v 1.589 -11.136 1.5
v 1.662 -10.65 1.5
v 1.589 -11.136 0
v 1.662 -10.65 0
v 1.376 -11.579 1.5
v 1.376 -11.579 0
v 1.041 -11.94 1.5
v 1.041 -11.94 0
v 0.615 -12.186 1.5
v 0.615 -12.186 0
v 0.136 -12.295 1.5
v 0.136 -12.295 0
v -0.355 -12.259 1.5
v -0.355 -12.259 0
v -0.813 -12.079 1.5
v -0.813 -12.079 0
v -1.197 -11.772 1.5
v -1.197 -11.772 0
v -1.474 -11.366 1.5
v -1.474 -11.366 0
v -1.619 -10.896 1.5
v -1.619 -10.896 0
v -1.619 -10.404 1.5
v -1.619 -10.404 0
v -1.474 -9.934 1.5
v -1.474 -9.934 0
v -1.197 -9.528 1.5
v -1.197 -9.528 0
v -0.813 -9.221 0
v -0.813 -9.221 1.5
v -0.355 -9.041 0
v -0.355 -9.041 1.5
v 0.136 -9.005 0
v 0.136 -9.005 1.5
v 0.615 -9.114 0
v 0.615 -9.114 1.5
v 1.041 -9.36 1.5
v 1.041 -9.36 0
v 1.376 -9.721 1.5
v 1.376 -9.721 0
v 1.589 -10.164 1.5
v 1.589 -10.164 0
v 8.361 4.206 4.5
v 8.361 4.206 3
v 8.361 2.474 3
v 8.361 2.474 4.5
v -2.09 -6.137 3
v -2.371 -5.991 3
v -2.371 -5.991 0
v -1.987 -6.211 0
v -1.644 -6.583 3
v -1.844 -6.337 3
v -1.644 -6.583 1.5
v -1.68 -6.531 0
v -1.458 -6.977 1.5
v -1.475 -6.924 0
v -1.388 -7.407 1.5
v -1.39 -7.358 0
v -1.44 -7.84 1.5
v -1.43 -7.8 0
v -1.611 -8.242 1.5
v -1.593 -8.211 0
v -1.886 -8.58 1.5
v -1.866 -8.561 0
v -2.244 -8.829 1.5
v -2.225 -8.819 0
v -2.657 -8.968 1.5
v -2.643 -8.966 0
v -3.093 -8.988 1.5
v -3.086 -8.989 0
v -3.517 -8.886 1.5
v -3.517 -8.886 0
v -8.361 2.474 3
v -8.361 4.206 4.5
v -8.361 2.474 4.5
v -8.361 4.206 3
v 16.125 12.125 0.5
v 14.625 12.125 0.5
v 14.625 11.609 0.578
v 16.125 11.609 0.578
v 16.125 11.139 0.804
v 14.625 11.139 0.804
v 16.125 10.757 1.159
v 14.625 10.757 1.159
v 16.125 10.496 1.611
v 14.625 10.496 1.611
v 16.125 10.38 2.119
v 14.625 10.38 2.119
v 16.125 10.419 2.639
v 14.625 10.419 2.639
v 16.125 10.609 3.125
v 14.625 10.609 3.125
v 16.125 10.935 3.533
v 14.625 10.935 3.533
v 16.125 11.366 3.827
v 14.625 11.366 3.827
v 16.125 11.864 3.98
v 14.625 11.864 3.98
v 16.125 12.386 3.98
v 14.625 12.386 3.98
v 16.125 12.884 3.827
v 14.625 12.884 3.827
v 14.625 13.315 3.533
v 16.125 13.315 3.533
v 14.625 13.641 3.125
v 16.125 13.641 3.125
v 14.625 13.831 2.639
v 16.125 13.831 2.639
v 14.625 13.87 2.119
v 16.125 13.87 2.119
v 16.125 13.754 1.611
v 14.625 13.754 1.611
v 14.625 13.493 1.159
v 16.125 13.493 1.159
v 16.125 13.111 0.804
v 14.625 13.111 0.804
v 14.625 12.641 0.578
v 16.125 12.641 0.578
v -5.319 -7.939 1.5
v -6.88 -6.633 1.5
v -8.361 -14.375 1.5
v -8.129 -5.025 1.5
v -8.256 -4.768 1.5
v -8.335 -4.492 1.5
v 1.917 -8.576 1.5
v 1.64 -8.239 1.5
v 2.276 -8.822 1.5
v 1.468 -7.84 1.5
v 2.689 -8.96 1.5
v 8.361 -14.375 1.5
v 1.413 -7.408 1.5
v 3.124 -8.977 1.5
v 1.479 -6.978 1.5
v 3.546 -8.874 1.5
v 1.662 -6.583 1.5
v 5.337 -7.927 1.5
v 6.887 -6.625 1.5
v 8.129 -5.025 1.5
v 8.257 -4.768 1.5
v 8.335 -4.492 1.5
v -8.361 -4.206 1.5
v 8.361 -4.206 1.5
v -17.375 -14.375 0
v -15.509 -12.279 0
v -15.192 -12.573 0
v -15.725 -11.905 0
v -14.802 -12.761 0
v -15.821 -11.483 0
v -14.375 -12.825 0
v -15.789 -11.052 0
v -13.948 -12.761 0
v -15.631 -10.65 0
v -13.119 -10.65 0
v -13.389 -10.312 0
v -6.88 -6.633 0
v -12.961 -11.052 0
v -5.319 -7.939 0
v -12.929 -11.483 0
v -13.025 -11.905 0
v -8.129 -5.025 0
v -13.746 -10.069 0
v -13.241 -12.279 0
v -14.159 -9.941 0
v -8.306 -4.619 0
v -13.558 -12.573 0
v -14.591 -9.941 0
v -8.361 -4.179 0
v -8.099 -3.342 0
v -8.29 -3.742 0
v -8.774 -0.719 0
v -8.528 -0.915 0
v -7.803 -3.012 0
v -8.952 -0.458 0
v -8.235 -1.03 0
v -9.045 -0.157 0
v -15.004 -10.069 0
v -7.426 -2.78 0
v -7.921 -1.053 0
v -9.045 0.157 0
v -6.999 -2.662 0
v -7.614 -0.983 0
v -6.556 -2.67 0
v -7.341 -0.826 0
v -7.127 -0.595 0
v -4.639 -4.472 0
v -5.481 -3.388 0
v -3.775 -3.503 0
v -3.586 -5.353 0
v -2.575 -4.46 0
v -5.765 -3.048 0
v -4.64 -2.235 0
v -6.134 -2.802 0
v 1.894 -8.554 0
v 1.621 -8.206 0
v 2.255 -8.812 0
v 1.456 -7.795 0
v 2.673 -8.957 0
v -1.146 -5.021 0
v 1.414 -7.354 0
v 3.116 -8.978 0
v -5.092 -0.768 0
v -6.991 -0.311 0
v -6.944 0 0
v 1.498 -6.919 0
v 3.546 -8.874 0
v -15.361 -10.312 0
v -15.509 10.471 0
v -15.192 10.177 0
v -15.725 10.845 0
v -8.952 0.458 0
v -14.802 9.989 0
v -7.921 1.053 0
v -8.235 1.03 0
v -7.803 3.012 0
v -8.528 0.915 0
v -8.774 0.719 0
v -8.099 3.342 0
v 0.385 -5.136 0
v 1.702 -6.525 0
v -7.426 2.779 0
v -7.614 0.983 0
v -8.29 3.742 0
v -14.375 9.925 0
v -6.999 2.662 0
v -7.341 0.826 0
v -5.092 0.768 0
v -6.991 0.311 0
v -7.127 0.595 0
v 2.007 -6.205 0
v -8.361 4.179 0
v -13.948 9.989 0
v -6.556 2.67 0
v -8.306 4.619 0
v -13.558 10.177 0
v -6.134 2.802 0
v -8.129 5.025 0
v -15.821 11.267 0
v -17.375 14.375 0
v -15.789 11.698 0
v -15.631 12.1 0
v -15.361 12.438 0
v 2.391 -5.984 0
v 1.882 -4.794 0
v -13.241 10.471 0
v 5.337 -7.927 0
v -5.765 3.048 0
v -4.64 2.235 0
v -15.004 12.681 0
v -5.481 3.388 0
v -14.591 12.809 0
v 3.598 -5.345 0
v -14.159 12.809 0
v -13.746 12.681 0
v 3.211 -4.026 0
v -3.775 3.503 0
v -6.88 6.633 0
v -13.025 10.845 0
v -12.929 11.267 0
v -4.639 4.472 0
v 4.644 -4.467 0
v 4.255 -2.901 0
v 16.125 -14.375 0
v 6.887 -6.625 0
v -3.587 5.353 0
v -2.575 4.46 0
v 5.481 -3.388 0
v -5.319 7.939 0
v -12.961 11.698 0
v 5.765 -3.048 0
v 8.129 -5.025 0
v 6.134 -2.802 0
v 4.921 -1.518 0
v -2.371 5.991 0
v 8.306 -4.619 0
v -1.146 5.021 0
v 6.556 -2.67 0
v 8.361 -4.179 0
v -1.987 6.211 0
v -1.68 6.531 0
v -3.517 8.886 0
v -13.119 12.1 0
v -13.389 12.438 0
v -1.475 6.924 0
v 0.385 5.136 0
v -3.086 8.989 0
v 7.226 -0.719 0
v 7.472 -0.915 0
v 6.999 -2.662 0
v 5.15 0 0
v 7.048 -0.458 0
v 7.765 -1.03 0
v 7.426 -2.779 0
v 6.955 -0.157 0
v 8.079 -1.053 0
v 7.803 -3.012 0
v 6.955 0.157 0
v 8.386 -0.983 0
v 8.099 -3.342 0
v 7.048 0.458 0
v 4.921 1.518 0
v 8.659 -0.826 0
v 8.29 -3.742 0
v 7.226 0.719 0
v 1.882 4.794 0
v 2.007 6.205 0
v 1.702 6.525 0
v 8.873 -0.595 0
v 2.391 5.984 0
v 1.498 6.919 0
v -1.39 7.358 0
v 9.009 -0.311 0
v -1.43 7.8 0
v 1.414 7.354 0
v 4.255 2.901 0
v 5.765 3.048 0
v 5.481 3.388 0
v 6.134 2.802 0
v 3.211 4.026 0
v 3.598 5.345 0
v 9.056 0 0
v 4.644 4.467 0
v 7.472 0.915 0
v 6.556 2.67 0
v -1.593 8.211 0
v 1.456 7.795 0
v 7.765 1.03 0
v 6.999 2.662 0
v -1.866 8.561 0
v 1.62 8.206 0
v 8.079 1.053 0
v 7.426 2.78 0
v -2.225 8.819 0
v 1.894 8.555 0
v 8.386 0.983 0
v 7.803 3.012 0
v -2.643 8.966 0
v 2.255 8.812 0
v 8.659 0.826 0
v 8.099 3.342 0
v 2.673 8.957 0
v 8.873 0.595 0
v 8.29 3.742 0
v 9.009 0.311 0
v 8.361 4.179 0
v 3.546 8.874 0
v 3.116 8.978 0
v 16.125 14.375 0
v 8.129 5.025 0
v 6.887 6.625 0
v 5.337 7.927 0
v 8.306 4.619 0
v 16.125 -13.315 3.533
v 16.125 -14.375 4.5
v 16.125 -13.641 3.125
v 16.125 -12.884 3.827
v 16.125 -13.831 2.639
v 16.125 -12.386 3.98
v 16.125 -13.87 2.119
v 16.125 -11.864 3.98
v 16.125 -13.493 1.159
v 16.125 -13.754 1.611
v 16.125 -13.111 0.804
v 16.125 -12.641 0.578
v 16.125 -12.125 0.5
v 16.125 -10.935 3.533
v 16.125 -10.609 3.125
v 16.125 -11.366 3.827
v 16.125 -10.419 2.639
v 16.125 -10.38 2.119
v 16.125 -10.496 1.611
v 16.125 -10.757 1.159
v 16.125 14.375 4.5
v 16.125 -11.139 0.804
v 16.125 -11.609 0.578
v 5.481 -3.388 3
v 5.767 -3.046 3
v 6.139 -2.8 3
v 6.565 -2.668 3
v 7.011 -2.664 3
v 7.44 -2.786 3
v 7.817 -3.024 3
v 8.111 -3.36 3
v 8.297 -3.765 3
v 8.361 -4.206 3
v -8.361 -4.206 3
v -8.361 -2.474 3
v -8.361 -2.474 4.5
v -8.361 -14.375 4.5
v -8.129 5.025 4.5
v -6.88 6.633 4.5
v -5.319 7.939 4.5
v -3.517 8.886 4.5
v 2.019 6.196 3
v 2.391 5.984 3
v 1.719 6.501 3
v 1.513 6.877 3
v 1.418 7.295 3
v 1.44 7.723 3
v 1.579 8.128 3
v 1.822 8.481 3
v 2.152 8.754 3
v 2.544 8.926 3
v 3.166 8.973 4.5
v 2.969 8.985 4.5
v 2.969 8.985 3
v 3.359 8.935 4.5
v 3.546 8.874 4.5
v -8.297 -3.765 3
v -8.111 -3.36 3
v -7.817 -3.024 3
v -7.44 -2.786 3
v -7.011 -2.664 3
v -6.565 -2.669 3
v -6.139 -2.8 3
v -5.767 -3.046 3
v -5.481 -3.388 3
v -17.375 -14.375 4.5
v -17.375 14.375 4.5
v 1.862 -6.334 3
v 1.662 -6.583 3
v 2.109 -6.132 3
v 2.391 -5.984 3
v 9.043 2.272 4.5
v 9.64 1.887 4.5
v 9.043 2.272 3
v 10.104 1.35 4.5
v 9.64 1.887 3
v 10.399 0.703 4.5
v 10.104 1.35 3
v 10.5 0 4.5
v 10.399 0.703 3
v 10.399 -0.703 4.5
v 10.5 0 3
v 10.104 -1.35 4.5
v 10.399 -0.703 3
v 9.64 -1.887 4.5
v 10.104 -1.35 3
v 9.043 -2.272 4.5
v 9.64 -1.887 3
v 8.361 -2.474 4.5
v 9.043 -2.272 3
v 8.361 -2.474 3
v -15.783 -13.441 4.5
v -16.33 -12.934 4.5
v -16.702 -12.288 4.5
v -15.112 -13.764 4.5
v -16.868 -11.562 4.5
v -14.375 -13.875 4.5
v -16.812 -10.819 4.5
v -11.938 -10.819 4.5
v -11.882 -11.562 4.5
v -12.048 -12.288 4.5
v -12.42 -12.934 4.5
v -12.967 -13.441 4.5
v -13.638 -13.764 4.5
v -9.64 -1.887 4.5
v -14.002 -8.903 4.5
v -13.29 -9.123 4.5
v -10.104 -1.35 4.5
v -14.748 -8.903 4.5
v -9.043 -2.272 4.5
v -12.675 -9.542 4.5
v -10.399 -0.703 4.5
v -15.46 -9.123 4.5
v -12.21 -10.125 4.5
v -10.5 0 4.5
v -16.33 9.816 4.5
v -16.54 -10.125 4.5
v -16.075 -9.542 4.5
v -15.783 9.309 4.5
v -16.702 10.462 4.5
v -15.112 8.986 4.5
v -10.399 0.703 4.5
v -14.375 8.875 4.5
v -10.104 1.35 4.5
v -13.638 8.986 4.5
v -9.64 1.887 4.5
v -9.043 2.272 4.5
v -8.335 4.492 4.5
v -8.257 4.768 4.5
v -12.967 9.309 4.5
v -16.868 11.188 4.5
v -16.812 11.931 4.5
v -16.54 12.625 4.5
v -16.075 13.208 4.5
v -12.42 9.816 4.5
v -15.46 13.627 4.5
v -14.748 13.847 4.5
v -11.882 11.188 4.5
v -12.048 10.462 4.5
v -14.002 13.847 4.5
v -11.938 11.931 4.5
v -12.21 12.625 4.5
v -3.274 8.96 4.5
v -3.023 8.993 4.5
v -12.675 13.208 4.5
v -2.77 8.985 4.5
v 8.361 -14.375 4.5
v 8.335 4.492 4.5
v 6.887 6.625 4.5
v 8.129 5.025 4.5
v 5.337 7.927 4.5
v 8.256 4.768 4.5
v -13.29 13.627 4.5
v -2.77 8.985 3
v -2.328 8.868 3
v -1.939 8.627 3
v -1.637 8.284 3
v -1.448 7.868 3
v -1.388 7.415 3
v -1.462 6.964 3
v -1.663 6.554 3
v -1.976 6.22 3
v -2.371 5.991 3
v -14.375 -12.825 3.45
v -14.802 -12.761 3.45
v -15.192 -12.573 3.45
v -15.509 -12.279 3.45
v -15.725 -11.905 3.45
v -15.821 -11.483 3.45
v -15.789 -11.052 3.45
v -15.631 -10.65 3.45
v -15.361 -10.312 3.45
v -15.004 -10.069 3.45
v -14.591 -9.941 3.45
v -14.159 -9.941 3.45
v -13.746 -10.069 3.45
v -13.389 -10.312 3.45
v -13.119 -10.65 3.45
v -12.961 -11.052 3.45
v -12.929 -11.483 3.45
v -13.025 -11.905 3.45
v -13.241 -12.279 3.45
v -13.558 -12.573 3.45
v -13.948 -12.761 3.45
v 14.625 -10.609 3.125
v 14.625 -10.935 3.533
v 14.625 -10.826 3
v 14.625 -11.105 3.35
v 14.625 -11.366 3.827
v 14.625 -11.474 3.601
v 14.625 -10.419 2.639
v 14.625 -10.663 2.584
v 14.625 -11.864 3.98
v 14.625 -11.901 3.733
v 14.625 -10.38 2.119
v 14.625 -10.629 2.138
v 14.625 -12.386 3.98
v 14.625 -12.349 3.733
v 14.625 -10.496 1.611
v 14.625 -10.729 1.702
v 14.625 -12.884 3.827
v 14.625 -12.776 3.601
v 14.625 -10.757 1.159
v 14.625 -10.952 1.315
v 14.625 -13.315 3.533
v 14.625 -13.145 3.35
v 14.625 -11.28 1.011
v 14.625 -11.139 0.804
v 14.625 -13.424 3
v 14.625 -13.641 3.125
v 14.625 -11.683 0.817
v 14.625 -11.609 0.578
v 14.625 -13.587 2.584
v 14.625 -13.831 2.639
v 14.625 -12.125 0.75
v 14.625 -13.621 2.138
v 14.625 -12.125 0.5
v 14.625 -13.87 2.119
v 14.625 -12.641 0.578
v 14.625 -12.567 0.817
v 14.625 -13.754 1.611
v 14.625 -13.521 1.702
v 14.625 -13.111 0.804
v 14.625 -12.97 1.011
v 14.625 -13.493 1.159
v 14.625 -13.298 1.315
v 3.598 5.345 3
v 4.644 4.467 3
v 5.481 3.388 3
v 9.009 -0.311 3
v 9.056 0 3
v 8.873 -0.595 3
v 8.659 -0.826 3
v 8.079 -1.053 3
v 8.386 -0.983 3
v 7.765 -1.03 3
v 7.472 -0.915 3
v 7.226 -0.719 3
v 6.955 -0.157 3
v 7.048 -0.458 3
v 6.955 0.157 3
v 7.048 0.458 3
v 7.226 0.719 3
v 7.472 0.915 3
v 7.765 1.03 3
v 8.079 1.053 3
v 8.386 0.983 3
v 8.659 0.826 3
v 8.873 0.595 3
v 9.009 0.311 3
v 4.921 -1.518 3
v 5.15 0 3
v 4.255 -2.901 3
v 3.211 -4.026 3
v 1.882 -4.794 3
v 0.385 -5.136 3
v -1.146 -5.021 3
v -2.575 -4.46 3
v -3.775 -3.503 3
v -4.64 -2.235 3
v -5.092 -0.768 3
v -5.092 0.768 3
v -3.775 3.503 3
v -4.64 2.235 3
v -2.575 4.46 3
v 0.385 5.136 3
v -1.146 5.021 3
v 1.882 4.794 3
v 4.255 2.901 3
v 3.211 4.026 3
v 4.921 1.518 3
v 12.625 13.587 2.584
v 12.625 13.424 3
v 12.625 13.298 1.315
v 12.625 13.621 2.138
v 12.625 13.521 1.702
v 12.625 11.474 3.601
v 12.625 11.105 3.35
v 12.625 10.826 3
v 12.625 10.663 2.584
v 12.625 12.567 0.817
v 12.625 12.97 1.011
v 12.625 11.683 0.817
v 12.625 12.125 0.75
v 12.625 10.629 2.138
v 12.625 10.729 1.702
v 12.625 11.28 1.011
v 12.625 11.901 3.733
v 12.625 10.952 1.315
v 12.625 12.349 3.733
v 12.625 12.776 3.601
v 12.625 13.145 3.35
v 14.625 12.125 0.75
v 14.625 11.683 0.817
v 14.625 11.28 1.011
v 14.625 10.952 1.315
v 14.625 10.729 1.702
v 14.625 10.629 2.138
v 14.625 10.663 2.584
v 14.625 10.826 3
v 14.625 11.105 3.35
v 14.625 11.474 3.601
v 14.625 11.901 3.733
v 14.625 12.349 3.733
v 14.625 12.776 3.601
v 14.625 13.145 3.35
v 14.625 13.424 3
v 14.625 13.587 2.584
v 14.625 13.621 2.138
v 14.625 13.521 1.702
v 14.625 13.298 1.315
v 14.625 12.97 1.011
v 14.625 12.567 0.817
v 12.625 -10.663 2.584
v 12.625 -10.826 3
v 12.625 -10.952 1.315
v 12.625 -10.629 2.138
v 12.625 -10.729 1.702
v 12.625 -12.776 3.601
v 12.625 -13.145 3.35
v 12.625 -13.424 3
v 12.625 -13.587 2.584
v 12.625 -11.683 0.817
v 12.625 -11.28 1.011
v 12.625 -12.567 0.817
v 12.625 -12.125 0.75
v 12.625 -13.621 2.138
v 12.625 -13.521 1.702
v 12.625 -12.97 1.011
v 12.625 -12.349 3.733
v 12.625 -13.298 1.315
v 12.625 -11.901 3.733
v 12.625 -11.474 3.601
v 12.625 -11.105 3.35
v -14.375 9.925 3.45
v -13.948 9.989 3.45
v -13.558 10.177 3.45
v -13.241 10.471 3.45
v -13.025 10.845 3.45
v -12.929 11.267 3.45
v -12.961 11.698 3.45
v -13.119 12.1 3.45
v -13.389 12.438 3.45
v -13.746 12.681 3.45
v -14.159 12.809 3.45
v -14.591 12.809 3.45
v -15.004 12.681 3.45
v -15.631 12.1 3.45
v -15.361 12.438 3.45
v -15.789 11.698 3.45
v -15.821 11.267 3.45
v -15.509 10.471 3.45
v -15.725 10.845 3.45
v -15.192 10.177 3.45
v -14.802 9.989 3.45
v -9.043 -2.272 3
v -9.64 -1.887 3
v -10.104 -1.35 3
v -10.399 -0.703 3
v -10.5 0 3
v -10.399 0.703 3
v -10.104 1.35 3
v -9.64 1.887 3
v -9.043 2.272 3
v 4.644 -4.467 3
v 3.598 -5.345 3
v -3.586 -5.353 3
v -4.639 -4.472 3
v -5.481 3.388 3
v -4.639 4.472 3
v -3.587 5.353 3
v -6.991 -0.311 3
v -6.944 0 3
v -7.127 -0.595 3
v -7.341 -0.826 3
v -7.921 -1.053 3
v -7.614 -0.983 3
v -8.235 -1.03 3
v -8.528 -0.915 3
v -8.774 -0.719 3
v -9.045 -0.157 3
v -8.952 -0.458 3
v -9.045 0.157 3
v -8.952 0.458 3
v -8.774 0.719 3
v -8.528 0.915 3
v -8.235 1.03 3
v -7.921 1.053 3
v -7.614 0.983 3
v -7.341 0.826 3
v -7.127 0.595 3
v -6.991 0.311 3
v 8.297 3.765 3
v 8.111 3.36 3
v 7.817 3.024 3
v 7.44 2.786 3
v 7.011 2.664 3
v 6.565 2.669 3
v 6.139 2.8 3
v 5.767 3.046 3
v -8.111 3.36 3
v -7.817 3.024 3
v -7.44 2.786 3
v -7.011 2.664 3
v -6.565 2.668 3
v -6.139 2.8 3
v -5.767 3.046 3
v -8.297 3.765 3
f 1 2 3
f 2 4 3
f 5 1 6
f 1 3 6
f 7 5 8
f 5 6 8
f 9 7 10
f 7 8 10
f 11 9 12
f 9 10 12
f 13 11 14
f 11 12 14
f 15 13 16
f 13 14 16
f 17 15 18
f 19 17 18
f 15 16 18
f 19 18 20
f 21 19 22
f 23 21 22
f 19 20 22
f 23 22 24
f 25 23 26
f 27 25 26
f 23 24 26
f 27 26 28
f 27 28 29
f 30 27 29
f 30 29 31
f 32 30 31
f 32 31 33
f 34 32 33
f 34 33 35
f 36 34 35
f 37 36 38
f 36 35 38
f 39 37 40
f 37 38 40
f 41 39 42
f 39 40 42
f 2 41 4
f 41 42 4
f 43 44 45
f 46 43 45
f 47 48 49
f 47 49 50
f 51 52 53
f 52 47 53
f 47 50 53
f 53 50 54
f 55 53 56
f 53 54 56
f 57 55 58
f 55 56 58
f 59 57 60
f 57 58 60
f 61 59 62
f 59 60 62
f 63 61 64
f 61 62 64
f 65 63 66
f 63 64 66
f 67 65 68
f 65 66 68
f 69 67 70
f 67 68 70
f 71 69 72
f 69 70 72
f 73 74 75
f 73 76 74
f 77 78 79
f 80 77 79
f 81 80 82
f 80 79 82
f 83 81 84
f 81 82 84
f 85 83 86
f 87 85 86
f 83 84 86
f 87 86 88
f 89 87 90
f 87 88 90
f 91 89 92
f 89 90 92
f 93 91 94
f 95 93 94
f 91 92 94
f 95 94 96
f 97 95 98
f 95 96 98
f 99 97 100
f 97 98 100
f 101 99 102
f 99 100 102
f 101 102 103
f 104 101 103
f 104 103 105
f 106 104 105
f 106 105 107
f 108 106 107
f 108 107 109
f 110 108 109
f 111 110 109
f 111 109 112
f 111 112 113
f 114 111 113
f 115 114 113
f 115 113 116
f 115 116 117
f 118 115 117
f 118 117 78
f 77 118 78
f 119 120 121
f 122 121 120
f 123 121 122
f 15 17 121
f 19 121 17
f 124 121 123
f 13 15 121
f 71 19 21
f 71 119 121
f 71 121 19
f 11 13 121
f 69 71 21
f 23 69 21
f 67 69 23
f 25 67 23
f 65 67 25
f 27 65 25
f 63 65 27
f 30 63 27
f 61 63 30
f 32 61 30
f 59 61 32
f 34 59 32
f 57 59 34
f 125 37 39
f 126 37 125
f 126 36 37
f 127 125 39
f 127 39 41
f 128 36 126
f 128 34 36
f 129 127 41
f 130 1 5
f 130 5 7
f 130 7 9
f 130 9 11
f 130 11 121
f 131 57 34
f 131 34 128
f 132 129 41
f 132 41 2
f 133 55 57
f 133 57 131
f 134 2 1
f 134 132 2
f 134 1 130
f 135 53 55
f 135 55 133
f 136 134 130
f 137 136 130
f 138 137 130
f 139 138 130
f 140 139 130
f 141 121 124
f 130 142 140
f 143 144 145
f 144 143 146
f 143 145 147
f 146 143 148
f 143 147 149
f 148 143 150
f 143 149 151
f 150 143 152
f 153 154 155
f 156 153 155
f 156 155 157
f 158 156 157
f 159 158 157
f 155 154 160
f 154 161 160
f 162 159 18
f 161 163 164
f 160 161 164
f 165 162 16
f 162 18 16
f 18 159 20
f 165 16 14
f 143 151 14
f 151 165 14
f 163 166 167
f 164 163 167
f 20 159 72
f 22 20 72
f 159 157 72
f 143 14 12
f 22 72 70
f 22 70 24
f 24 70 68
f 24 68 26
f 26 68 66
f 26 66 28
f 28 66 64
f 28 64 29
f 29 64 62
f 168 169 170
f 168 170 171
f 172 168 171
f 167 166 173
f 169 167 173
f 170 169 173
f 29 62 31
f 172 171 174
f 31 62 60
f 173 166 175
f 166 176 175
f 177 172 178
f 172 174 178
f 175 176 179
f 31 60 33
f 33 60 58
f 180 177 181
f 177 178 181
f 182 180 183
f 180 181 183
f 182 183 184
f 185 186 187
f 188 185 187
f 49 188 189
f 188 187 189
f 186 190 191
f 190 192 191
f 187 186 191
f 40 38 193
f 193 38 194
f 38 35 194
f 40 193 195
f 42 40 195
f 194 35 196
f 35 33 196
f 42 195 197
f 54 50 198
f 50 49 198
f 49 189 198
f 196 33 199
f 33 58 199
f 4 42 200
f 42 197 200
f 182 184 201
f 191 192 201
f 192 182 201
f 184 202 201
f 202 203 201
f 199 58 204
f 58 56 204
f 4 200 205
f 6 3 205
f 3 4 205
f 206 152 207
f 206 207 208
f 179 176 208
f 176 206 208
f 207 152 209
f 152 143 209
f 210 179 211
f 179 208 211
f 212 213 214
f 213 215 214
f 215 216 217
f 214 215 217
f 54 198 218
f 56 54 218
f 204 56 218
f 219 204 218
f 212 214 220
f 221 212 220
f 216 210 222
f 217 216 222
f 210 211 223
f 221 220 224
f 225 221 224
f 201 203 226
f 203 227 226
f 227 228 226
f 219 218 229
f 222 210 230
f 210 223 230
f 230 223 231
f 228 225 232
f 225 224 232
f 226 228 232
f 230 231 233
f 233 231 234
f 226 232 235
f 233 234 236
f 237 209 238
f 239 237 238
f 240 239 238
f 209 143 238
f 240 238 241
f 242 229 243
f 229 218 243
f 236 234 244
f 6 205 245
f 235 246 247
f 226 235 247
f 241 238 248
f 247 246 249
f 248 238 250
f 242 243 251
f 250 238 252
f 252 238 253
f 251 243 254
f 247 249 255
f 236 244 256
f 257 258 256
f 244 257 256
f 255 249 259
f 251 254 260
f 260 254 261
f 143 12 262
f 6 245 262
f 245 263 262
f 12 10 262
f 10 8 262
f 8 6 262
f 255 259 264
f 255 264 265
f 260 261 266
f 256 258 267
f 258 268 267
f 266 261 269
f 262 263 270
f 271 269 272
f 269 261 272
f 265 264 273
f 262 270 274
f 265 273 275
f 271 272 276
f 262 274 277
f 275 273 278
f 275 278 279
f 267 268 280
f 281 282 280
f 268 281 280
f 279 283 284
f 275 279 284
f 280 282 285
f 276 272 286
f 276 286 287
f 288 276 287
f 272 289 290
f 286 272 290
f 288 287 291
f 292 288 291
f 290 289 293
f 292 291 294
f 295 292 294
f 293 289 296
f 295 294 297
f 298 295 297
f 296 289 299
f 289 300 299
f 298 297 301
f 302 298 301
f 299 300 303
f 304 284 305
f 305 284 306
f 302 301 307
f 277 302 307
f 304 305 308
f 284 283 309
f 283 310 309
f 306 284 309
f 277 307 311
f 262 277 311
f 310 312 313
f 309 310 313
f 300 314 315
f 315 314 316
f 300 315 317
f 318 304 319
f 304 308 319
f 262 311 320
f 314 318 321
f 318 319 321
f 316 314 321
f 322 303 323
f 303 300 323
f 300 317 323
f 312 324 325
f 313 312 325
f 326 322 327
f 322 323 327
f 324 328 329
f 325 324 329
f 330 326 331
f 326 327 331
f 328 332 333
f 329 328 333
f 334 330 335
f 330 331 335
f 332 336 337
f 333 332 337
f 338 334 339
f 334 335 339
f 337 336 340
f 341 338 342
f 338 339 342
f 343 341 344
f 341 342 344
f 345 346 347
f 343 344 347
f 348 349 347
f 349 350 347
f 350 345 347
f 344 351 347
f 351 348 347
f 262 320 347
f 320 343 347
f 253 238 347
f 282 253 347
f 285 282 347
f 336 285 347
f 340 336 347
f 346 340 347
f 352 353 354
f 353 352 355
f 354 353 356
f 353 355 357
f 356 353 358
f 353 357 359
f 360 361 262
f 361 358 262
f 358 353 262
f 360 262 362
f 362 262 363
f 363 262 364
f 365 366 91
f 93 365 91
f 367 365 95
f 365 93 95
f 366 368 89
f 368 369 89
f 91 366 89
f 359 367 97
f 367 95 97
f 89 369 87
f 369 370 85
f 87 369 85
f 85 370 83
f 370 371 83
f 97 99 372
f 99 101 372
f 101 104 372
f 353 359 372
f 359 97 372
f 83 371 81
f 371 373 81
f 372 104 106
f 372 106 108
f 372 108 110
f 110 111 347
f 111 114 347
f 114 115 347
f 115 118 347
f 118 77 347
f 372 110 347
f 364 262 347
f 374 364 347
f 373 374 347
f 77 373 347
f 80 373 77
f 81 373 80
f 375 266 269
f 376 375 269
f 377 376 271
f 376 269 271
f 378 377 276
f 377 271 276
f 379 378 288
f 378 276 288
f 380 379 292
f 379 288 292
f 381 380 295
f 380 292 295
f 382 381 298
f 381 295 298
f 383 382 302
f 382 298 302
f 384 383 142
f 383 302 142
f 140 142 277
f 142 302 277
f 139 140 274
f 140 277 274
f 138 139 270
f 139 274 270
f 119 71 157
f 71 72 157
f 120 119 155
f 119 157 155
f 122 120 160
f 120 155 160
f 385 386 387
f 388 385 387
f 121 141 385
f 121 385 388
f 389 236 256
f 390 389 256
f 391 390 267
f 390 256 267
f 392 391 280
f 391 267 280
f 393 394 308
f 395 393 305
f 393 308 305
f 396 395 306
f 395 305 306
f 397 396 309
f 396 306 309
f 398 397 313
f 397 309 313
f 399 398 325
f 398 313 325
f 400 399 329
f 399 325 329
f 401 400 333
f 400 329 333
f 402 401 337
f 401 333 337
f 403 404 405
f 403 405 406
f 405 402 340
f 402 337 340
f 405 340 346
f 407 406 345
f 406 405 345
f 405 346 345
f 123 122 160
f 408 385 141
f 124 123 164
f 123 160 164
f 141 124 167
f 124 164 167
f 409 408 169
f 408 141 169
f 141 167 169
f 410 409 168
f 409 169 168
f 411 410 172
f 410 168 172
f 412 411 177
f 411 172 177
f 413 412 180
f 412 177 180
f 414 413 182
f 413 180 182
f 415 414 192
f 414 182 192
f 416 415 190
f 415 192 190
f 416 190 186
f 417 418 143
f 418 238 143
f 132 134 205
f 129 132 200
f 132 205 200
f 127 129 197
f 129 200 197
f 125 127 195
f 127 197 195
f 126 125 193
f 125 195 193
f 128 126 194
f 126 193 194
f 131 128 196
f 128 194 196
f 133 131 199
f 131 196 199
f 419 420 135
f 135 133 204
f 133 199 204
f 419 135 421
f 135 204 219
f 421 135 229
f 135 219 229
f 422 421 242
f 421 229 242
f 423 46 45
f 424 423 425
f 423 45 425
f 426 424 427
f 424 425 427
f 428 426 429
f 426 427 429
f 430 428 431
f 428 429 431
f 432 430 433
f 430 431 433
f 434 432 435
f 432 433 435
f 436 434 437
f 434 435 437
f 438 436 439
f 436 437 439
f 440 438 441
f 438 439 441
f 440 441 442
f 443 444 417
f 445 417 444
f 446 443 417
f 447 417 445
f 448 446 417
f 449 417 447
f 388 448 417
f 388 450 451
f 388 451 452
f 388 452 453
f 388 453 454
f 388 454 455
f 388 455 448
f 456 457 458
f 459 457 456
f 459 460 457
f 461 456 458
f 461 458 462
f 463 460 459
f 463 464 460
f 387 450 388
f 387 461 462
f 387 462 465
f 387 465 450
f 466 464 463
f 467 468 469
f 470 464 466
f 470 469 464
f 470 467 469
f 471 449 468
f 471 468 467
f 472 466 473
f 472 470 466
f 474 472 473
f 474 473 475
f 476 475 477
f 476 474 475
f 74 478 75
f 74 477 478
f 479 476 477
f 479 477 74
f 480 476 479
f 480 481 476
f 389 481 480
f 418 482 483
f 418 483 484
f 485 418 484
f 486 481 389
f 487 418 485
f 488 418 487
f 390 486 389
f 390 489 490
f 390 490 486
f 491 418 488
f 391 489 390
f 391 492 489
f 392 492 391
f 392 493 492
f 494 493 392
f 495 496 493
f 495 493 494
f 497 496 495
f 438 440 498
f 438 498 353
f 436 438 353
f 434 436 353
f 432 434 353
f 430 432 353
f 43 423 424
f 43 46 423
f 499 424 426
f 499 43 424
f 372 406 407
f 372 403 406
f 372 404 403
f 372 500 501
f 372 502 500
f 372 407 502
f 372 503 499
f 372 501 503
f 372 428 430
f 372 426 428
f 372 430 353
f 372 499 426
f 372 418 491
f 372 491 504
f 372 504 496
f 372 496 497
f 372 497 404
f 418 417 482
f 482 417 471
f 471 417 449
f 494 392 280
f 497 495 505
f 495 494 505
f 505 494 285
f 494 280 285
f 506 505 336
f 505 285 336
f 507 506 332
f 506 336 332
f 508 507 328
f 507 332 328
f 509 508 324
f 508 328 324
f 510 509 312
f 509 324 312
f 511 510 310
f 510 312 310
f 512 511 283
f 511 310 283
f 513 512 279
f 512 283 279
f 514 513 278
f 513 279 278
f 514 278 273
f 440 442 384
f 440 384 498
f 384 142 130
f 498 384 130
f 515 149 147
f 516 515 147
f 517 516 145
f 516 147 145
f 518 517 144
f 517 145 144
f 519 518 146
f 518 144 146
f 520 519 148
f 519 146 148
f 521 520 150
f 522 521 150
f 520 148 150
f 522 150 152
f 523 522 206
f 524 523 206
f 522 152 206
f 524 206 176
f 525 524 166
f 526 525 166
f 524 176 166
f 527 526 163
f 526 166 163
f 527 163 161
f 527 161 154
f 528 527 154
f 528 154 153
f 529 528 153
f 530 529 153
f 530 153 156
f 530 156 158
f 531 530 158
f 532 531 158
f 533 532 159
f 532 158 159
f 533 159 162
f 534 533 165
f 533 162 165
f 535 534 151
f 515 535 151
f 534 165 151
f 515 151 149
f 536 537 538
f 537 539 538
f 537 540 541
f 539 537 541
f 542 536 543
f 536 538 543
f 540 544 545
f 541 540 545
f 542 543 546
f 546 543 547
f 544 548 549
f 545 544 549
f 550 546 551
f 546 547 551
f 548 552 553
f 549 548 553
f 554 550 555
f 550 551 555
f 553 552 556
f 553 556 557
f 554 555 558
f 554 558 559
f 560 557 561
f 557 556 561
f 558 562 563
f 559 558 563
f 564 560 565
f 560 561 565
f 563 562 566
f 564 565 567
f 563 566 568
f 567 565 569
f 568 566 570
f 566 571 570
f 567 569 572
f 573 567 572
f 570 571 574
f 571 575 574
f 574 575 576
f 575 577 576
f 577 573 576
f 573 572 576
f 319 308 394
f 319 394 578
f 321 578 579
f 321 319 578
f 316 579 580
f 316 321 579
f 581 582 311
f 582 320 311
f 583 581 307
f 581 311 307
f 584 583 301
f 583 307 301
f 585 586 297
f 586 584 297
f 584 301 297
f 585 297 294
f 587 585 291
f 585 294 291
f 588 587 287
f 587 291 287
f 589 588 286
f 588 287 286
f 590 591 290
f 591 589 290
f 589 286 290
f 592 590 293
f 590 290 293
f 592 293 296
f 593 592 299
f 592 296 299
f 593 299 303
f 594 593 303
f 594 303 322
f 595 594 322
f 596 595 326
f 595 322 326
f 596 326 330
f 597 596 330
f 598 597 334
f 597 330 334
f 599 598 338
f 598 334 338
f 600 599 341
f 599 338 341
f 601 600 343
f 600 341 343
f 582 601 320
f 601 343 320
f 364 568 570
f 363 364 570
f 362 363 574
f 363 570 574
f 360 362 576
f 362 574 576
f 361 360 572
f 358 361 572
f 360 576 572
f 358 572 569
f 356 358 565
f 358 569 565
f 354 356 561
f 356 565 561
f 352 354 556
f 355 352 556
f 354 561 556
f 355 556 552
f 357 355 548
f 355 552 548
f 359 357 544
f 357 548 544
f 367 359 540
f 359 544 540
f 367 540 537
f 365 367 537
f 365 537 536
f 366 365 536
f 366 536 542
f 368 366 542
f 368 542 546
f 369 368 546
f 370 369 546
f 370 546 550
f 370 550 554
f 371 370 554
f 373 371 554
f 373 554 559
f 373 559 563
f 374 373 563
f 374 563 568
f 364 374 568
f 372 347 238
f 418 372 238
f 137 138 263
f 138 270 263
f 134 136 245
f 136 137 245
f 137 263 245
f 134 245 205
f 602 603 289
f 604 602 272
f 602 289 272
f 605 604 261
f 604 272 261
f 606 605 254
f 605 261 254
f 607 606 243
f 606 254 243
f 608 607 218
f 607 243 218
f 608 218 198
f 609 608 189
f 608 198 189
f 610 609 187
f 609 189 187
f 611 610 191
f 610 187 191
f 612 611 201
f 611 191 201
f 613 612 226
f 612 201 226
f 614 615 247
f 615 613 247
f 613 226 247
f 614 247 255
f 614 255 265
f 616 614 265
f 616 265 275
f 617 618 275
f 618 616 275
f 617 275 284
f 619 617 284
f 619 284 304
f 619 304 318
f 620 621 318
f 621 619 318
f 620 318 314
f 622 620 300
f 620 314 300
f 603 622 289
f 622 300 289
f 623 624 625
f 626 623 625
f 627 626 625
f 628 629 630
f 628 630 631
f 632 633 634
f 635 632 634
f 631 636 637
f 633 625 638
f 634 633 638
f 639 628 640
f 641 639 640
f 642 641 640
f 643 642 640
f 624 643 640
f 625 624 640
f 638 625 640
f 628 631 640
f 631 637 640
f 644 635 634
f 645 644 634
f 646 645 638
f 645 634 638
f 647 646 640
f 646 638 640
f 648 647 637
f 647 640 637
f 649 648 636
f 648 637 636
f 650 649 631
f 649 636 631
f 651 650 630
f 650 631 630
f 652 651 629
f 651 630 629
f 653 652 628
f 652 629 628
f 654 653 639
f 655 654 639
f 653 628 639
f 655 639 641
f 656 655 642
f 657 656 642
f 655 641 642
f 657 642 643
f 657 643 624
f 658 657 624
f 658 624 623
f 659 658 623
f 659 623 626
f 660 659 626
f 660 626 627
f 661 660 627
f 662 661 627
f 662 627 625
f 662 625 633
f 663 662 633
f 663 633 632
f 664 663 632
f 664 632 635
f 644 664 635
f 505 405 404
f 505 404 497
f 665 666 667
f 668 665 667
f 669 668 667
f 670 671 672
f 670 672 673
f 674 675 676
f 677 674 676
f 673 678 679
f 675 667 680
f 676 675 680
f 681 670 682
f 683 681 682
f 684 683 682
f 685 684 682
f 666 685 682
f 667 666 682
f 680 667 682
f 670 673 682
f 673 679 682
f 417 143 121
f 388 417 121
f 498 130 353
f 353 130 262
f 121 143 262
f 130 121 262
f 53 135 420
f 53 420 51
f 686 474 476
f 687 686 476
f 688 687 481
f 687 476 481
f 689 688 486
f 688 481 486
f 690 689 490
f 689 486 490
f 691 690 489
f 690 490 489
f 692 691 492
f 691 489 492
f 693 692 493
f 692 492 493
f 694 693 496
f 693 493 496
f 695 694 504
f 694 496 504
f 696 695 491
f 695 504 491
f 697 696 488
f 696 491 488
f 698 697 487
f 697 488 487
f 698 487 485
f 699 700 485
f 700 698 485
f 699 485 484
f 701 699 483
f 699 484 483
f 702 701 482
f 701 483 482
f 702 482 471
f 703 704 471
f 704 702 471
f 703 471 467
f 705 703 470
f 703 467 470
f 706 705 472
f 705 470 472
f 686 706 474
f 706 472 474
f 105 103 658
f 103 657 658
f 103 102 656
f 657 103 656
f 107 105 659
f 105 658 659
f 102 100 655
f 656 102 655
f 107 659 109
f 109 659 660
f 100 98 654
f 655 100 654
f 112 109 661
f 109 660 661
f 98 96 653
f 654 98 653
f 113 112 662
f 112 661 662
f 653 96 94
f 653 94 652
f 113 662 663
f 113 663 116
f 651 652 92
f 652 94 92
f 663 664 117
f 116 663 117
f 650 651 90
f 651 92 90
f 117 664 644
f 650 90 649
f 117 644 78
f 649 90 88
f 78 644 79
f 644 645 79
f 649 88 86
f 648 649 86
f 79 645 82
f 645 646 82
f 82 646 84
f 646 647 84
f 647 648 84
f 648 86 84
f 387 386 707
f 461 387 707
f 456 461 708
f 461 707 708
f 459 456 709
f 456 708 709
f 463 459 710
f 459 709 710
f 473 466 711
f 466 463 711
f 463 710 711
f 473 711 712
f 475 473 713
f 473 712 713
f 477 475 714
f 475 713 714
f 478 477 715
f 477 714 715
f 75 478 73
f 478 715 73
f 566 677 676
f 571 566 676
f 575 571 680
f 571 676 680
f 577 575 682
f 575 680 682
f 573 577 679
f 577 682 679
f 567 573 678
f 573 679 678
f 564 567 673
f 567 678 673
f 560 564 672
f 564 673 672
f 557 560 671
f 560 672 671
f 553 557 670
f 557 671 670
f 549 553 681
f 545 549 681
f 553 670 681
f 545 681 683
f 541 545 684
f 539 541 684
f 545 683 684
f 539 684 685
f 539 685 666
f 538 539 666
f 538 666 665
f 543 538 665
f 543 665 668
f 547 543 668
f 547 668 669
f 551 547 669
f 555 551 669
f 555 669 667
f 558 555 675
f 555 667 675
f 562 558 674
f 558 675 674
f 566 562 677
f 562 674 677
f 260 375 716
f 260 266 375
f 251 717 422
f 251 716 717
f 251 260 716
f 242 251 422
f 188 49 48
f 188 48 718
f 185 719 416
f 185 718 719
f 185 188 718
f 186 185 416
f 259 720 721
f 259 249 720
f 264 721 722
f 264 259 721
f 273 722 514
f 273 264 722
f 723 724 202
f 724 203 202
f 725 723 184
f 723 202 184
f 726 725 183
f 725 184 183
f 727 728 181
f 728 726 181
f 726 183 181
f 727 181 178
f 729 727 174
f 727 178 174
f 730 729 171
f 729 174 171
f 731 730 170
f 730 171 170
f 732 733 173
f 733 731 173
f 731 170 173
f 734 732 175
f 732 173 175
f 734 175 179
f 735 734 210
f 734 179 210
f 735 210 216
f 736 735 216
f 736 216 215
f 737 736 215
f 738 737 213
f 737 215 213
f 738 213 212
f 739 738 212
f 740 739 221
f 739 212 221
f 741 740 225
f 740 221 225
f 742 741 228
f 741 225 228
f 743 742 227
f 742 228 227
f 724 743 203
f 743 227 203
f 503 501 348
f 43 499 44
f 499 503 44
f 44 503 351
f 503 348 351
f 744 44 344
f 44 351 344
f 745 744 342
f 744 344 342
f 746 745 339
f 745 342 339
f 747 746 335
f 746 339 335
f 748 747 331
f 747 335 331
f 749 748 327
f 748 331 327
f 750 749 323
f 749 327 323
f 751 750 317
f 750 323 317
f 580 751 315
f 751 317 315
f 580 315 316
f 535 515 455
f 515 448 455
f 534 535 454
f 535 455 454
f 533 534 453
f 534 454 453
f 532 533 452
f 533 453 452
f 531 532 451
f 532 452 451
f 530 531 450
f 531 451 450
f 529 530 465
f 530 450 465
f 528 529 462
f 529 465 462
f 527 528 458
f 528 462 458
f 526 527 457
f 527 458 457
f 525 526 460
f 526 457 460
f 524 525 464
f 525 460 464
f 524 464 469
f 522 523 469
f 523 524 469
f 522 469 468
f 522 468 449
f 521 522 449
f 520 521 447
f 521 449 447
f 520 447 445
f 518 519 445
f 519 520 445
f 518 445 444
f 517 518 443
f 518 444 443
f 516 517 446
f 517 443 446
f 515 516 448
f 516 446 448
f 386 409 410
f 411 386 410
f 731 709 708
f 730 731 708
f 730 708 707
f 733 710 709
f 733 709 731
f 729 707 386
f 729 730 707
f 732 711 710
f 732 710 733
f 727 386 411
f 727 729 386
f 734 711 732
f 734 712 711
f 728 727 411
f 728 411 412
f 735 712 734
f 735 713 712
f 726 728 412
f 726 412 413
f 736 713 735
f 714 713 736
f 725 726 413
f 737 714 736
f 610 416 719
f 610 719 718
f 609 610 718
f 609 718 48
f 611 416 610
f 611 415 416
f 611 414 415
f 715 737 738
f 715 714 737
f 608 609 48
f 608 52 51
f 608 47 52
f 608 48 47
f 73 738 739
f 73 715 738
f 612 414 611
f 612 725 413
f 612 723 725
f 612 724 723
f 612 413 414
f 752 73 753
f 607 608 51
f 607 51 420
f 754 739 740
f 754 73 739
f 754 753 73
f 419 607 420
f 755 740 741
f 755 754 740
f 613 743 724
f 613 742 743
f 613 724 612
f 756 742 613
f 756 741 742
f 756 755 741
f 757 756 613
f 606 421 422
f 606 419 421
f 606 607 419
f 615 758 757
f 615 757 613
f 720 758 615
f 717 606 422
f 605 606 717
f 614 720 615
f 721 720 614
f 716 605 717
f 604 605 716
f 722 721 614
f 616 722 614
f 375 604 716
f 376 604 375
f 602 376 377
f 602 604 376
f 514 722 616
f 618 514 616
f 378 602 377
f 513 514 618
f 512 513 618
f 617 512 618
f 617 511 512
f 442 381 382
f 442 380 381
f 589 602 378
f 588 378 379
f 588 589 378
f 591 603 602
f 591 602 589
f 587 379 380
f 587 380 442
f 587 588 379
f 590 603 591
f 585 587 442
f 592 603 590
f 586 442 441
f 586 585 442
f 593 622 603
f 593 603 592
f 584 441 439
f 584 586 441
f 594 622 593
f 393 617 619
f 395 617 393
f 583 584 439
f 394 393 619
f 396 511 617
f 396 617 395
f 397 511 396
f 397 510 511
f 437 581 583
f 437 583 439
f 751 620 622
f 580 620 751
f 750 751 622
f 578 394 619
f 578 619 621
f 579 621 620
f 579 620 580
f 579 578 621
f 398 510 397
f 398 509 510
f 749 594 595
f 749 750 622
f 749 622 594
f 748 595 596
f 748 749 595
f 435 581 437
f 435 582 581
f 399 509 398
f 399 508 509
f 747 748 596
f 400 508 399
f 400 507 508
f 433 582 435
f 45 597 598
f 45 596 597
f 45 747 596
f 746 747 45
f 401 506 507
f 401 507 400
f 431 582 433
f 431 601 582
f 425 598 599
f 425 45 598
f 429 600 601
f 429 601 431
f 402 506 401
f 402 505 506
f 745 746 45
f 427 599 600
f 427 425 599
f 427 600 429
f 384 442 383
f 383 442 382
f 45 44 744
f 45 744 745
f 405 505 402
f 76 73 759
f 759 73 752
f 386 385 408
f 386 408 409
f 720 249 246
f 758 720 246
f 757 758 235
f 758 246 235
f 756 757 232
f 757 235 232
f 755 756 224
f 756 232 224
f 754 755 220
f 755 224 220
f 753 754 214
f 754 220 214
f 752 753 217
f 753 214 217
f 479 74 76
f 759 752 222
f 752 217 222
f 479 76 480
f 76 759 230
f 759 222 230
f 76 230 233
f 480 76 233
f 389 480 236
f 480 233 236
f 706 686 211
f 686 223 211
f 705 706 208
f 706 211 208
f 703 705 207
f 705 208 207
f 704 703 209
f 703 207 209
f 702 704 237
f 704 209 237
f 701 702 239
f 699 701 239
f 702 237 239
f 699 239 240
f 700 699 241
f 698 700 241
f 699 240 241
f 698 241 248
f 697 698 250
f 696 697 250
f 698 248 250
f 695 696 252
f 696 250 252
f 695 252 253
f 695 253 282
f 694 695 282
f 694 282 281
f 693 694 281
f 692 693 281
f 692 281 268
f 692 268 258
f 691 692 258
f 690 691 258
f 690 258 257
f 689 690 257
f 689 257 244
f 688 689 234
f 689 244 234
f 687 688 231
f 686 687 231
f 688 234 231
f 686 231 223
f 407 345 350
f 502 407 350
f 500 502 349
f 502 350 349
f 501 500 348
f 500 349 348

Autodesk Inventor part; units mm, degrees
ref_plane "YZ Plane" through (0, 0, 0) normal (1, 0, 0) x (0, 1, 0)
ref_plane "XZ Plane" through (0, 0, 0) normal (0, 1, 0) x (-1, 0, 0)
ref_plane "XY Plane" through (0, 0, 0) normal (0, 0, 1) x (1, 0, 0)
ref_plane "Work Plane1" through (0, 0, 0) normal (0, 0, 1) x (1, 0, 0)
sketch "Sketch1" plane through (0, 0, 0) normal (0, 0, 1) x (1, 0, 0)
  arc A0 (5.9062, 3.651) -> (7.7035, 4.7619) centre (6.8048, 4.2064) ccw projected
  arc A1 (5.9062, 3.651) -> (2.5768, 6.4477) centre (0, 0) ccw projected
  arc A2 (3.3608, 8.4097) -> (2.5768, 6.4477) centre (2.9688, 7.4287) ccw projected
  arc A3 (7.7035, 4.7619) -> (3.3608, 8.4097) centre (0, 0) ccw projected
  arc A4 (2.5768, -6.4477) -> (3.3608, -8.4097) centre (2.9688, -7.4287) ccw projected
  arc A5 (2.5768, -6.4477) -> (5.9062, -3.651) centre (0, 0) ccw projected
  arc A6 (7.7035, -4.7619) -> (5.9062, -3.651) centre (6.8048, -4.2064) ccw projected
  arc A7 (3.3608, -8.4097) -> (7.7035, -4.7619) centre (0, 0) ccw projected
  arc A8 (-2.5553, 6.4563) -> (-3.3328, 8.4209) centre (-2.9441, 7.4386) ccw projected
  arc A9 (-2.5553, 6.4563) -> (-5.9062, 3.651) centre (0, 0) ccw projected
  arc A10 (-7.7035, 4.7619) -> (-5.9062, 3.651) centre (-6.8048, 4.2064) ccw projected
  arc A11 (-3.3328, 8.4209) -> (-7.7035, 4.7619) centre (0, 0) ccw projected
  arc A12 (-5.9062, -3.651) -> (-7.7035, -4.7619) centre (-6.8048, -4.2064) ccw projected
  arc A13 (-5.9062, -3.651) -> (-2.5553, -6.4563) centre (0, 0) ccw projected
  arc A14 (-3.3328, -8.4209) -> (-2.5553, -6.4563) centre (-2.9441, -7.4386) ccw projected
  arc A15 (-7.7035, -4.7619) -> (-3.3328, -8.4209) centre (0, 0) ccw projected
  circle A16 centre (0.0124, -10.65) radius 1.15 projected
  circle A17 centre (8, 0) radius 1.0564 projected
  circle A18 centre (-8, 0) radius 1.0564 projected
  circle A19 centre (0, 0) radius 5 projected
  circle A20 centre (0, 0) radius 13.7 projected
  line L0 (0, 14.375) -> (-17.375, 14.375) projected
  line L1 (-17.375, 14.375) -> (-17.375, -14.375) projected
  line L2 (-17.375, -14.375) -> (0, -14.375) projected
  circle A21 centre (0, 0) radius 5.15
  arc A22 (5.4809, 3.3881) -> (8.1288, 5.0248) centre (6.8048, 4.2064) ccw
  arc A23 (5.4809, 3.3881) -> (2.3912, 5.9835) centre (0, 0) ccw
  arc A24 (3.5464, 8.874) -> (2.3912, 5.9835) centre (2.9688, 7.4287) ccw
  arc A25 (8.1288, 5.0248) -> (3.5464, 8.874) centre (0, 0) ccw
  arc A26 (8.1288, -5.0248) -> (5.4809, -3.3881) centre (6.8048, -4.2064) ccw
  arc A27 (2.3912, -5.9835) -> (5.4809, -3.3881) centre (0, 0) ccw
  arc A28 (2.3912, -5.9835) -> (3.5464, -8.874) centre (2.9688, -7.4287) ccw
  arc A29 (3.5464, -8.874) -> (8.1288, -5.0248) centre (0, 0) ccw
  circle A30 centre (0.0124, -10.65) radius 1.65
  arc A31 (-5.4809, -3.3881) -> (-2.3713, -5.9914) centre (0, 0) ccw
  arc A32 (-5.4809, -3.3881) -> (-8.1288, -5.0248) centre (-6.8048, -4.2064) ccw
  arc A33 (-8.1288, -5.0248) -> (-3.5168, -8.8858) centre (0, 0) ccw
  arc A34 (-3.5168, -8.8858) -> (-2.3713, -5.9914) centre (-2.9441, -7.4386) ccw
  arc A35 (-2.3713, 5.9914) -> (-5.4809, 3.3881) centre (0, 0) ccw
  arc A36 (-2.3713, 5.9914) -> (-3.5168, 8.8858) centre (-2.9441, 7.4386) ccw
  arc A37 (-3.5168, 8.8858) -> (-8.1288, 5.0248) centre (0, 0) ccw
  arc A38 (-8.1288, 5.0248) -> (-5.4809, 3.3881) centre (-6.8048, 4.2064) ccw
  circle A39 centre (-14.375, -11.375) radius 1.75 projected
  circle A40 centre (-14.375, 11.375) radius 1.75 projected
  arc A41 (0, 13.7) -> (0, -13.7) centre (0, 0) ccw projected
  line L3 (0, -14.375) -> (0, -13.7) projected
  line L4 (0, 13.7) -> (0, 14.375) projected
  line L5 (16.125, 8.6145) -> (16.125, -8.7895) projected
  line L6 (0, -14.375) -> (16.125, -14.375)
  line L7 (16.125, -14.375) -> (16.125, 14.375)
  line L8 (16.125, 14.375) -> (0, 14.375)
  line L9 (0, 14.375) -> (0, -14.375)
  point P0 (0, 0)
  dimension "d0" = 0.15
  dimension "d1" = 0.5
  dimension "d2" = 0.5
  dimension "d3" = 0.5
  dimension "d4" = 0.5
  dimension "d5" = 0.5
extrude "Extrusion1" add sketch "Sketch1" along normal blind 1.5 contours L9 A21 A20 A30 | A30 L9 A20 A21 | L3 L2 L1 L0 L4 A20 | A20 L4 L8 L7 L5 L6 L3 | A39 | A40
sketch "Sketch2" plane through (0, 0, 1.5) normal (0, 0, 1) x (1, 0, 0)
  line L0 (-17.375, 14.375) -> (-17.375, -14.375) projected
  line L1 (-17.375, -14.375) -> (16.125, -14.375) projected
  line L2 (16.125, -14.375) -> (16.125, 14.375) projected
  line L3 (16.125, 14.375) -> (-17.375, 14.375) projected
  circle A0 centre (8, 0) radius 1.0564 projected
  circle A1 centre (-8, 0) radius 1.0564 projected
  circle A2 centre (0, 0) radius 5.15 projected
  arc A3 (5.4809, 3.3881) -> (2.3912, 5.9835) centre (0, 0) ccw projected
  arc A4 (3.5464, 8.874) -> (2.3912, 5.9835) centre (2.9688, 7.4287) ccw projected
  arc A5 (8.1288, 5.0248) -> (3.5464, 8.874) centre (0, 0) ccw projected
  arc A6 (5.4809, 3.3881) -> (8.1288, 5.0248) centre (6.8048, 4.2064) ccw projected
  arc A7 (2.3912, -5.9835) -> (5.4809, -3.3881) centre (0, 0) ccw projected
  arc A8 (8.1288, -5.0248) -> (5.4809, -3.3881) centre (6.8048, -4.2064) ccw projected
  arc A9 (3.5464, -8.874) -> (8.1288, -5.0248) centre (0, 0) ccw projected
  arc A10 (2.3912, -5.9835) -> (3.5464, -8.874) centre (2.9688, -7.4287) ccw projected
  circle A11 centre (0.0124, -10.65) radius 1.65 projected
  arc A12 (-5.4809, -3.3881) -> (-8.1288, -5.0248) centre (-6.8048, -4.2064) ccw projected
  arc A13 (-5.4809, -3.3881) -> (-2.3713, -5.9914) centre (0, 0) ccw projected
  arc A14 (-3.5168, -8.8858) -> (-2.3713, -5.9914) centre (-2.9441, -7.4386) ccw projected
  arc A15 (-8.1288, -5.0248) -> (-3.5168, -8.8858) centre (0, 0) ccw projected
  arc A16 (-2.3713, 5.9914) -> (-3.5168, 8.8858) centre (-2.9441, 7.4386) ccw projected
  arc A17 (-2.3713, 5.9914) -> (-5.4809, 3.3881) centre (0, 0) ccw projected
  arc A18 (-8.1288, 5.0248) -> (-5.4809, 3.3881) centre (-6.8048, 4.2064) ccw projected
  arc A19 (-3.5168, 8.8858) -> (-8.1288, 5.0248) centre (0, 0) ccw projected
  arc A20 (8.1288, -5.0248) -> (5.4809, -3.3881) centre (6.8048, -4.2064) ccw projected
  line L4 (8.3613, -4.2064) -> (8.3613, -14.375)
  line L5 (-17.375, -14.375) -> (16.125, -14.375) projected
  arc A21 (-5.4809, -3.3881) -> (-8.1288, -5.0248) centre (-6.8048, -4.2064) ccw projected
  line L6 (-8.3613, -4.2064) -> (-8.3613, -14.375)
  arc A22 (2.3912, -5.9835) -> (3.5464, -8.874) centre (2.9688, -7.4287) ccw projected
  line L7 (1.6624, -6.5827) -> (-1.6441, -6.5827)
  arc A23 (-3.5168, -8.8858) -> (-2.3713, -5.9914) centre (-2.9441, -7.4386) ccw projected
  point P0 (0, 0)
extrude "Extrusion2" add sketch "Sketch2" along normal blind 1.5 contours L3 L2 L1 L4 A8 A7 A10 L7 A14 A13 A12 L6 L0
sketch "Sketch3" plane through (0, 0, 3) normal (0, 0, 1) x (1, 0, 0)
  circle A0 centre (0, 0) radius 6.75 projected
  line L0 (-17.375, -14.375) -> (-8.3613, -14.375) projected
  line L1 (-8.3613, -14.375) -> (-8.3613, -4.2064) projected
  arc A1 (-5.4809, -3.3881) -> (-8.3613, -4.2064) centre (-6.8048, -4.2064) ccw projected
  arc A2 (-5.4809, -3.3881) -> (-2.3713, -5.9914) centre (0, 0) ccw projected
  arc A3 (-1.6441, -6.5827) -> (-2.3713, -5.9914) centre (-2.9441, -7.4386) ccw projected
  line L2 (-1.6441, -6.5827) -> (1.6624, -6.5827) projected
  arc A4 (2.3912, -5.9835) -> (1.6624, -6.5827) centre (2.9688, -7.4287) ccw projected
  arc A5 (2.3912, -5.9835) -> (5.4809, -3.3881) centre (0, 0) ccw projected
  arc A6 (8.3613, -4.2064) -> (5.4809, -3.3881) centre (6.8048, -4.2064) ccw projected
  line L3 (8.3613, -4.2064) -> (8.3613, -14.375) projected
  line L4 (8.3613, -14.375) -> (16.125, -14.375) projected
  line L5 (16.125, -14.375) -> (16.125, 14.375) projected
  line L6 (16.125, 14.375) -> (-17.375, 14.375) projected
  line L7 (-17.375, 14.375) -> (-17.375, -14.375) projected
  circle A7 centre (8, 0) radius 1.0564 projected
  circle A8 centre (-8, 0) radius 1.0564 projected
  arc A9 (-2.3713, 5.9914) -> (-5.4809, 3.3881) centre (0, 0) ccw projected
  arc A10 (-8.1288, 5.0248) -> (-5.4809, 3.3881) centre (-6.8048, 4.2064) ccw projected
  arc A11 (-3.5168, 8.8858) -> (-8.1288, 5.0248) centre (0, 0) ccw projected
  arc A12 (-2.3713, 5.9914) -> (-3.5168, 8.8858) centre (-2.9441, 7.4386) ccw projected
  arc A13 (5.4809, 3.3881) -> (8.1288, 5.0248) centre (6.8048, 4.2064) ccw projected
  arc A14 (5.4809, 3.3881) -> (2.3912, 5.9835) centre (0, 0) ccw projected
  arc A15 (3.5464, 8.874) -> (2.3912, 5.9835) centre (2.9688, 7.4287) ccw projected
  arc A16 (8.1288, 5.0248) -> (3.5464, 8.874) centre (0, 0) ccw projected
  circle A17 centre (0, 0) radius 5.15 projected
  circle A18 centre (8, 0) radius 2.5
  circle A19 centre (-8, 0) radius 2.5
  line L8 (2.9688, 8.9852) -> (-2.9441, 8.9852)
  line L9 (2.9688, 8.9852) -> (8.8817, 8.9852) construction
  arc A20 (-8.1288, 5.0248) -> (-5.4809, 3.3881) centre (-6.8048, 4.2064) ccw projected
  line L10 (-8.3613, 4.2064) -> (-8.3613, -4.2064)
  arc A21 (-5.4809, -3.3881) -> (-8.1288, -5.0248) centre (-6.8048, -4.2064) ccw projected
  arc A22 (5.4809, 3.3881) -> (8.1288, 5.0248) centre (6.8048, 4.2064) ccw projected
  line L11 (8.3613, 4.2064) -> (8.3613, -4.2064)
  point P0 (0, 0)
  point P1 (-8.3613, -2.4738)
  point P2 (-8.3613, 2.4738)
  point P3 (-2.7693, 8.9852)
  point P4 (8.3613, 2.4738)
  point P5 (8.3613, -2.4738)
  dimension "d10" = 5
  dimension "d11" = 5
  dimension "d12" = 180
extrude "Extrusion3" add sketch "Sketch3" along normal blind 1.5 contours L11 A13 A16 A15 L8 A12 A11 A10 L10 A19 L1 L0 L7 L6 L5 L4 L3 A18
sketch "Sketch4" plane through (0, 0, 4.5) normal (0, 0, 1) x (1, 0, 0)
  line L0 (16.125, -14.375) -> (16.125, 14.375) projected
  line L1 (-17.375, -14.375) -> (16.125, -14.375) projected
  line L2 (16.125, 14.375) -> (12.625, 14.375)
  line L3 (12.625, -14.375) -> (16.125, -14.375)
  line L4 (16.125, -14.375) -> (16.125, 14.375)
  circle A0 centre (13.125, 11.375) radius 3
  circle A1 centre (13.125, -11.375) radius 3
  circle A2 centre (-14.375, -11.375) radius 3
  circle A3 centre (-14.375, 11.375) radius 3
  line L5 (-8.3613, -14.375) -> (-8.3613, -2.4738) projected
  arc A4 (-8.3613, 2.4738) -> (-8.3613, -2.4738) centre (-8, 0) ccw projected
  line L6 (-8.3613, 2.4738) -> (-8.3613, 4.2064) projected
  arc A5 (-8.1288, 5.0248) -> (-8.3613, 4.2064) centre (-6.8048, 4.2064) ccw projected
  arc A6 (-3.5168, 8.8858) -> (-8.1288, 5.0248) centre (0, 0) ccw projected
  arc A7 (-2.7693, 8.9852) -> (-3.5168, 8.8858) centre (-2.9441, 7.4386) ccw projected
  line L7 (-2.7693, 8.9852) -> (2.9688, 8.9852) projected
  arc A8 (3.5464, 8.874) -> (2.9688, 8.9852) centre (2.9688, 7.4287) ccw projected
  arc A9 (8.1288, 5.0248) -> (3.5464, 8.874) centre (0, 0) ccw projected
  arc A10 (8.3613, 4.2064) -> (8.1288, 5.0248) centre (6.8048, 4.2064) ccw projected
  line L8 (8.3613, 4.2064) -> (8.3613, 2.4738) projected
  arc A11 (8.3613, -2.4738) -> (8.3613, 2.4738) centre (8, 0) ccw projected
  line L9 (8.3613, -2.4738) -> (8.3613, -14.375) projected
  line L10 (8.3613, -14.375) -> (16.125, -14.375) projected
  line L11 (16.125, -14.375) -> (16.125, 14.375) projected
  line L12 (16.125, 14.375) -> (-17.375, 14.375) projected
  line L13 (-17.375, 14.375) -> (-17.375, -14.375) projected
  line L14 (-17.375, -14.375) -> (-8.3613, -14.375) projected
  point P0 (0, 0)
  dimension "d16" = 6
  dimension "d17" = 6
  dimension "d18" = 6
  dimension "d19" = 6
hole "Hole1" at (-14.375, -11.375, 4.5) at (-14.375, 11.375, 4.5) direction (0, 0, -1) diameter 2.9 end through all countersink diameter 5 countersink angle 90 clearance for "Countersunk Flat Head Screw ISO 2009/7046" size "M2.5" standard "ISO"
sketch "Sketch6" plane through (16.125, -14.375, 0) normal (1, 0, 0) x (0, 0, -1)
  line L0 (0, 0) -> (0, 28.75) projected
  line L1 (0, 28.75) -> (-4.5, 28.75) projected
  line L2 (-4.5, 0) -> (-4.5, 28.75) projected
  line L3 (0, 0) -> (-4.5, 0) projected
  line L4 (0, 28.75) -> (-4.5, 28.75)
  line L5 (-4.5, 28.75) -> (-4.5, 24.25)
  line L6 (-4.5, 24.25) -> (0, 24.25)
  line L7 (0, 24.25) -> (0, 28.75)
  line L8 (0, 0) -> (-4.5, 0)
  line L9 (-4.5, 0) -> (-4.5, 4.5)
  line L10 (-4.5, 4.5) -> (0, 4.5)
  line L11 (0, 4.5) -> (0, 0)
  line L12 (-4.5, 24.25) -> (0, 28.75)
  line L13 (-4.5, 28.75) -> (0, 24.25)
  line L14 (0, 0) -> (-4.5, 0) projected
  line L15 (0, 4.5) -> (-4.5, 0)
  line L16 (0, 0) -> (-4.5, 4.5)
  point P0 (0, 14.375)
  point P1 (-2.25, 26.5)
  point P2 (-2.25, 2.25)
  dimension "d34" = 4.5
  dimension "d35" = 4.5
  dimension "d36" = 4.5
  dimension "d37" = 4.5
hole "Hole3" at (16.125, 12.125, 2.25) at (16.125, -12.125, 2.25) direction (-1, 0, 0) diameter 3 depth 3.5 counterbore diameter 3.5 counterbore depth 1.5
properties part number "right_motor_front_mount" material "Nylon 6/6"
